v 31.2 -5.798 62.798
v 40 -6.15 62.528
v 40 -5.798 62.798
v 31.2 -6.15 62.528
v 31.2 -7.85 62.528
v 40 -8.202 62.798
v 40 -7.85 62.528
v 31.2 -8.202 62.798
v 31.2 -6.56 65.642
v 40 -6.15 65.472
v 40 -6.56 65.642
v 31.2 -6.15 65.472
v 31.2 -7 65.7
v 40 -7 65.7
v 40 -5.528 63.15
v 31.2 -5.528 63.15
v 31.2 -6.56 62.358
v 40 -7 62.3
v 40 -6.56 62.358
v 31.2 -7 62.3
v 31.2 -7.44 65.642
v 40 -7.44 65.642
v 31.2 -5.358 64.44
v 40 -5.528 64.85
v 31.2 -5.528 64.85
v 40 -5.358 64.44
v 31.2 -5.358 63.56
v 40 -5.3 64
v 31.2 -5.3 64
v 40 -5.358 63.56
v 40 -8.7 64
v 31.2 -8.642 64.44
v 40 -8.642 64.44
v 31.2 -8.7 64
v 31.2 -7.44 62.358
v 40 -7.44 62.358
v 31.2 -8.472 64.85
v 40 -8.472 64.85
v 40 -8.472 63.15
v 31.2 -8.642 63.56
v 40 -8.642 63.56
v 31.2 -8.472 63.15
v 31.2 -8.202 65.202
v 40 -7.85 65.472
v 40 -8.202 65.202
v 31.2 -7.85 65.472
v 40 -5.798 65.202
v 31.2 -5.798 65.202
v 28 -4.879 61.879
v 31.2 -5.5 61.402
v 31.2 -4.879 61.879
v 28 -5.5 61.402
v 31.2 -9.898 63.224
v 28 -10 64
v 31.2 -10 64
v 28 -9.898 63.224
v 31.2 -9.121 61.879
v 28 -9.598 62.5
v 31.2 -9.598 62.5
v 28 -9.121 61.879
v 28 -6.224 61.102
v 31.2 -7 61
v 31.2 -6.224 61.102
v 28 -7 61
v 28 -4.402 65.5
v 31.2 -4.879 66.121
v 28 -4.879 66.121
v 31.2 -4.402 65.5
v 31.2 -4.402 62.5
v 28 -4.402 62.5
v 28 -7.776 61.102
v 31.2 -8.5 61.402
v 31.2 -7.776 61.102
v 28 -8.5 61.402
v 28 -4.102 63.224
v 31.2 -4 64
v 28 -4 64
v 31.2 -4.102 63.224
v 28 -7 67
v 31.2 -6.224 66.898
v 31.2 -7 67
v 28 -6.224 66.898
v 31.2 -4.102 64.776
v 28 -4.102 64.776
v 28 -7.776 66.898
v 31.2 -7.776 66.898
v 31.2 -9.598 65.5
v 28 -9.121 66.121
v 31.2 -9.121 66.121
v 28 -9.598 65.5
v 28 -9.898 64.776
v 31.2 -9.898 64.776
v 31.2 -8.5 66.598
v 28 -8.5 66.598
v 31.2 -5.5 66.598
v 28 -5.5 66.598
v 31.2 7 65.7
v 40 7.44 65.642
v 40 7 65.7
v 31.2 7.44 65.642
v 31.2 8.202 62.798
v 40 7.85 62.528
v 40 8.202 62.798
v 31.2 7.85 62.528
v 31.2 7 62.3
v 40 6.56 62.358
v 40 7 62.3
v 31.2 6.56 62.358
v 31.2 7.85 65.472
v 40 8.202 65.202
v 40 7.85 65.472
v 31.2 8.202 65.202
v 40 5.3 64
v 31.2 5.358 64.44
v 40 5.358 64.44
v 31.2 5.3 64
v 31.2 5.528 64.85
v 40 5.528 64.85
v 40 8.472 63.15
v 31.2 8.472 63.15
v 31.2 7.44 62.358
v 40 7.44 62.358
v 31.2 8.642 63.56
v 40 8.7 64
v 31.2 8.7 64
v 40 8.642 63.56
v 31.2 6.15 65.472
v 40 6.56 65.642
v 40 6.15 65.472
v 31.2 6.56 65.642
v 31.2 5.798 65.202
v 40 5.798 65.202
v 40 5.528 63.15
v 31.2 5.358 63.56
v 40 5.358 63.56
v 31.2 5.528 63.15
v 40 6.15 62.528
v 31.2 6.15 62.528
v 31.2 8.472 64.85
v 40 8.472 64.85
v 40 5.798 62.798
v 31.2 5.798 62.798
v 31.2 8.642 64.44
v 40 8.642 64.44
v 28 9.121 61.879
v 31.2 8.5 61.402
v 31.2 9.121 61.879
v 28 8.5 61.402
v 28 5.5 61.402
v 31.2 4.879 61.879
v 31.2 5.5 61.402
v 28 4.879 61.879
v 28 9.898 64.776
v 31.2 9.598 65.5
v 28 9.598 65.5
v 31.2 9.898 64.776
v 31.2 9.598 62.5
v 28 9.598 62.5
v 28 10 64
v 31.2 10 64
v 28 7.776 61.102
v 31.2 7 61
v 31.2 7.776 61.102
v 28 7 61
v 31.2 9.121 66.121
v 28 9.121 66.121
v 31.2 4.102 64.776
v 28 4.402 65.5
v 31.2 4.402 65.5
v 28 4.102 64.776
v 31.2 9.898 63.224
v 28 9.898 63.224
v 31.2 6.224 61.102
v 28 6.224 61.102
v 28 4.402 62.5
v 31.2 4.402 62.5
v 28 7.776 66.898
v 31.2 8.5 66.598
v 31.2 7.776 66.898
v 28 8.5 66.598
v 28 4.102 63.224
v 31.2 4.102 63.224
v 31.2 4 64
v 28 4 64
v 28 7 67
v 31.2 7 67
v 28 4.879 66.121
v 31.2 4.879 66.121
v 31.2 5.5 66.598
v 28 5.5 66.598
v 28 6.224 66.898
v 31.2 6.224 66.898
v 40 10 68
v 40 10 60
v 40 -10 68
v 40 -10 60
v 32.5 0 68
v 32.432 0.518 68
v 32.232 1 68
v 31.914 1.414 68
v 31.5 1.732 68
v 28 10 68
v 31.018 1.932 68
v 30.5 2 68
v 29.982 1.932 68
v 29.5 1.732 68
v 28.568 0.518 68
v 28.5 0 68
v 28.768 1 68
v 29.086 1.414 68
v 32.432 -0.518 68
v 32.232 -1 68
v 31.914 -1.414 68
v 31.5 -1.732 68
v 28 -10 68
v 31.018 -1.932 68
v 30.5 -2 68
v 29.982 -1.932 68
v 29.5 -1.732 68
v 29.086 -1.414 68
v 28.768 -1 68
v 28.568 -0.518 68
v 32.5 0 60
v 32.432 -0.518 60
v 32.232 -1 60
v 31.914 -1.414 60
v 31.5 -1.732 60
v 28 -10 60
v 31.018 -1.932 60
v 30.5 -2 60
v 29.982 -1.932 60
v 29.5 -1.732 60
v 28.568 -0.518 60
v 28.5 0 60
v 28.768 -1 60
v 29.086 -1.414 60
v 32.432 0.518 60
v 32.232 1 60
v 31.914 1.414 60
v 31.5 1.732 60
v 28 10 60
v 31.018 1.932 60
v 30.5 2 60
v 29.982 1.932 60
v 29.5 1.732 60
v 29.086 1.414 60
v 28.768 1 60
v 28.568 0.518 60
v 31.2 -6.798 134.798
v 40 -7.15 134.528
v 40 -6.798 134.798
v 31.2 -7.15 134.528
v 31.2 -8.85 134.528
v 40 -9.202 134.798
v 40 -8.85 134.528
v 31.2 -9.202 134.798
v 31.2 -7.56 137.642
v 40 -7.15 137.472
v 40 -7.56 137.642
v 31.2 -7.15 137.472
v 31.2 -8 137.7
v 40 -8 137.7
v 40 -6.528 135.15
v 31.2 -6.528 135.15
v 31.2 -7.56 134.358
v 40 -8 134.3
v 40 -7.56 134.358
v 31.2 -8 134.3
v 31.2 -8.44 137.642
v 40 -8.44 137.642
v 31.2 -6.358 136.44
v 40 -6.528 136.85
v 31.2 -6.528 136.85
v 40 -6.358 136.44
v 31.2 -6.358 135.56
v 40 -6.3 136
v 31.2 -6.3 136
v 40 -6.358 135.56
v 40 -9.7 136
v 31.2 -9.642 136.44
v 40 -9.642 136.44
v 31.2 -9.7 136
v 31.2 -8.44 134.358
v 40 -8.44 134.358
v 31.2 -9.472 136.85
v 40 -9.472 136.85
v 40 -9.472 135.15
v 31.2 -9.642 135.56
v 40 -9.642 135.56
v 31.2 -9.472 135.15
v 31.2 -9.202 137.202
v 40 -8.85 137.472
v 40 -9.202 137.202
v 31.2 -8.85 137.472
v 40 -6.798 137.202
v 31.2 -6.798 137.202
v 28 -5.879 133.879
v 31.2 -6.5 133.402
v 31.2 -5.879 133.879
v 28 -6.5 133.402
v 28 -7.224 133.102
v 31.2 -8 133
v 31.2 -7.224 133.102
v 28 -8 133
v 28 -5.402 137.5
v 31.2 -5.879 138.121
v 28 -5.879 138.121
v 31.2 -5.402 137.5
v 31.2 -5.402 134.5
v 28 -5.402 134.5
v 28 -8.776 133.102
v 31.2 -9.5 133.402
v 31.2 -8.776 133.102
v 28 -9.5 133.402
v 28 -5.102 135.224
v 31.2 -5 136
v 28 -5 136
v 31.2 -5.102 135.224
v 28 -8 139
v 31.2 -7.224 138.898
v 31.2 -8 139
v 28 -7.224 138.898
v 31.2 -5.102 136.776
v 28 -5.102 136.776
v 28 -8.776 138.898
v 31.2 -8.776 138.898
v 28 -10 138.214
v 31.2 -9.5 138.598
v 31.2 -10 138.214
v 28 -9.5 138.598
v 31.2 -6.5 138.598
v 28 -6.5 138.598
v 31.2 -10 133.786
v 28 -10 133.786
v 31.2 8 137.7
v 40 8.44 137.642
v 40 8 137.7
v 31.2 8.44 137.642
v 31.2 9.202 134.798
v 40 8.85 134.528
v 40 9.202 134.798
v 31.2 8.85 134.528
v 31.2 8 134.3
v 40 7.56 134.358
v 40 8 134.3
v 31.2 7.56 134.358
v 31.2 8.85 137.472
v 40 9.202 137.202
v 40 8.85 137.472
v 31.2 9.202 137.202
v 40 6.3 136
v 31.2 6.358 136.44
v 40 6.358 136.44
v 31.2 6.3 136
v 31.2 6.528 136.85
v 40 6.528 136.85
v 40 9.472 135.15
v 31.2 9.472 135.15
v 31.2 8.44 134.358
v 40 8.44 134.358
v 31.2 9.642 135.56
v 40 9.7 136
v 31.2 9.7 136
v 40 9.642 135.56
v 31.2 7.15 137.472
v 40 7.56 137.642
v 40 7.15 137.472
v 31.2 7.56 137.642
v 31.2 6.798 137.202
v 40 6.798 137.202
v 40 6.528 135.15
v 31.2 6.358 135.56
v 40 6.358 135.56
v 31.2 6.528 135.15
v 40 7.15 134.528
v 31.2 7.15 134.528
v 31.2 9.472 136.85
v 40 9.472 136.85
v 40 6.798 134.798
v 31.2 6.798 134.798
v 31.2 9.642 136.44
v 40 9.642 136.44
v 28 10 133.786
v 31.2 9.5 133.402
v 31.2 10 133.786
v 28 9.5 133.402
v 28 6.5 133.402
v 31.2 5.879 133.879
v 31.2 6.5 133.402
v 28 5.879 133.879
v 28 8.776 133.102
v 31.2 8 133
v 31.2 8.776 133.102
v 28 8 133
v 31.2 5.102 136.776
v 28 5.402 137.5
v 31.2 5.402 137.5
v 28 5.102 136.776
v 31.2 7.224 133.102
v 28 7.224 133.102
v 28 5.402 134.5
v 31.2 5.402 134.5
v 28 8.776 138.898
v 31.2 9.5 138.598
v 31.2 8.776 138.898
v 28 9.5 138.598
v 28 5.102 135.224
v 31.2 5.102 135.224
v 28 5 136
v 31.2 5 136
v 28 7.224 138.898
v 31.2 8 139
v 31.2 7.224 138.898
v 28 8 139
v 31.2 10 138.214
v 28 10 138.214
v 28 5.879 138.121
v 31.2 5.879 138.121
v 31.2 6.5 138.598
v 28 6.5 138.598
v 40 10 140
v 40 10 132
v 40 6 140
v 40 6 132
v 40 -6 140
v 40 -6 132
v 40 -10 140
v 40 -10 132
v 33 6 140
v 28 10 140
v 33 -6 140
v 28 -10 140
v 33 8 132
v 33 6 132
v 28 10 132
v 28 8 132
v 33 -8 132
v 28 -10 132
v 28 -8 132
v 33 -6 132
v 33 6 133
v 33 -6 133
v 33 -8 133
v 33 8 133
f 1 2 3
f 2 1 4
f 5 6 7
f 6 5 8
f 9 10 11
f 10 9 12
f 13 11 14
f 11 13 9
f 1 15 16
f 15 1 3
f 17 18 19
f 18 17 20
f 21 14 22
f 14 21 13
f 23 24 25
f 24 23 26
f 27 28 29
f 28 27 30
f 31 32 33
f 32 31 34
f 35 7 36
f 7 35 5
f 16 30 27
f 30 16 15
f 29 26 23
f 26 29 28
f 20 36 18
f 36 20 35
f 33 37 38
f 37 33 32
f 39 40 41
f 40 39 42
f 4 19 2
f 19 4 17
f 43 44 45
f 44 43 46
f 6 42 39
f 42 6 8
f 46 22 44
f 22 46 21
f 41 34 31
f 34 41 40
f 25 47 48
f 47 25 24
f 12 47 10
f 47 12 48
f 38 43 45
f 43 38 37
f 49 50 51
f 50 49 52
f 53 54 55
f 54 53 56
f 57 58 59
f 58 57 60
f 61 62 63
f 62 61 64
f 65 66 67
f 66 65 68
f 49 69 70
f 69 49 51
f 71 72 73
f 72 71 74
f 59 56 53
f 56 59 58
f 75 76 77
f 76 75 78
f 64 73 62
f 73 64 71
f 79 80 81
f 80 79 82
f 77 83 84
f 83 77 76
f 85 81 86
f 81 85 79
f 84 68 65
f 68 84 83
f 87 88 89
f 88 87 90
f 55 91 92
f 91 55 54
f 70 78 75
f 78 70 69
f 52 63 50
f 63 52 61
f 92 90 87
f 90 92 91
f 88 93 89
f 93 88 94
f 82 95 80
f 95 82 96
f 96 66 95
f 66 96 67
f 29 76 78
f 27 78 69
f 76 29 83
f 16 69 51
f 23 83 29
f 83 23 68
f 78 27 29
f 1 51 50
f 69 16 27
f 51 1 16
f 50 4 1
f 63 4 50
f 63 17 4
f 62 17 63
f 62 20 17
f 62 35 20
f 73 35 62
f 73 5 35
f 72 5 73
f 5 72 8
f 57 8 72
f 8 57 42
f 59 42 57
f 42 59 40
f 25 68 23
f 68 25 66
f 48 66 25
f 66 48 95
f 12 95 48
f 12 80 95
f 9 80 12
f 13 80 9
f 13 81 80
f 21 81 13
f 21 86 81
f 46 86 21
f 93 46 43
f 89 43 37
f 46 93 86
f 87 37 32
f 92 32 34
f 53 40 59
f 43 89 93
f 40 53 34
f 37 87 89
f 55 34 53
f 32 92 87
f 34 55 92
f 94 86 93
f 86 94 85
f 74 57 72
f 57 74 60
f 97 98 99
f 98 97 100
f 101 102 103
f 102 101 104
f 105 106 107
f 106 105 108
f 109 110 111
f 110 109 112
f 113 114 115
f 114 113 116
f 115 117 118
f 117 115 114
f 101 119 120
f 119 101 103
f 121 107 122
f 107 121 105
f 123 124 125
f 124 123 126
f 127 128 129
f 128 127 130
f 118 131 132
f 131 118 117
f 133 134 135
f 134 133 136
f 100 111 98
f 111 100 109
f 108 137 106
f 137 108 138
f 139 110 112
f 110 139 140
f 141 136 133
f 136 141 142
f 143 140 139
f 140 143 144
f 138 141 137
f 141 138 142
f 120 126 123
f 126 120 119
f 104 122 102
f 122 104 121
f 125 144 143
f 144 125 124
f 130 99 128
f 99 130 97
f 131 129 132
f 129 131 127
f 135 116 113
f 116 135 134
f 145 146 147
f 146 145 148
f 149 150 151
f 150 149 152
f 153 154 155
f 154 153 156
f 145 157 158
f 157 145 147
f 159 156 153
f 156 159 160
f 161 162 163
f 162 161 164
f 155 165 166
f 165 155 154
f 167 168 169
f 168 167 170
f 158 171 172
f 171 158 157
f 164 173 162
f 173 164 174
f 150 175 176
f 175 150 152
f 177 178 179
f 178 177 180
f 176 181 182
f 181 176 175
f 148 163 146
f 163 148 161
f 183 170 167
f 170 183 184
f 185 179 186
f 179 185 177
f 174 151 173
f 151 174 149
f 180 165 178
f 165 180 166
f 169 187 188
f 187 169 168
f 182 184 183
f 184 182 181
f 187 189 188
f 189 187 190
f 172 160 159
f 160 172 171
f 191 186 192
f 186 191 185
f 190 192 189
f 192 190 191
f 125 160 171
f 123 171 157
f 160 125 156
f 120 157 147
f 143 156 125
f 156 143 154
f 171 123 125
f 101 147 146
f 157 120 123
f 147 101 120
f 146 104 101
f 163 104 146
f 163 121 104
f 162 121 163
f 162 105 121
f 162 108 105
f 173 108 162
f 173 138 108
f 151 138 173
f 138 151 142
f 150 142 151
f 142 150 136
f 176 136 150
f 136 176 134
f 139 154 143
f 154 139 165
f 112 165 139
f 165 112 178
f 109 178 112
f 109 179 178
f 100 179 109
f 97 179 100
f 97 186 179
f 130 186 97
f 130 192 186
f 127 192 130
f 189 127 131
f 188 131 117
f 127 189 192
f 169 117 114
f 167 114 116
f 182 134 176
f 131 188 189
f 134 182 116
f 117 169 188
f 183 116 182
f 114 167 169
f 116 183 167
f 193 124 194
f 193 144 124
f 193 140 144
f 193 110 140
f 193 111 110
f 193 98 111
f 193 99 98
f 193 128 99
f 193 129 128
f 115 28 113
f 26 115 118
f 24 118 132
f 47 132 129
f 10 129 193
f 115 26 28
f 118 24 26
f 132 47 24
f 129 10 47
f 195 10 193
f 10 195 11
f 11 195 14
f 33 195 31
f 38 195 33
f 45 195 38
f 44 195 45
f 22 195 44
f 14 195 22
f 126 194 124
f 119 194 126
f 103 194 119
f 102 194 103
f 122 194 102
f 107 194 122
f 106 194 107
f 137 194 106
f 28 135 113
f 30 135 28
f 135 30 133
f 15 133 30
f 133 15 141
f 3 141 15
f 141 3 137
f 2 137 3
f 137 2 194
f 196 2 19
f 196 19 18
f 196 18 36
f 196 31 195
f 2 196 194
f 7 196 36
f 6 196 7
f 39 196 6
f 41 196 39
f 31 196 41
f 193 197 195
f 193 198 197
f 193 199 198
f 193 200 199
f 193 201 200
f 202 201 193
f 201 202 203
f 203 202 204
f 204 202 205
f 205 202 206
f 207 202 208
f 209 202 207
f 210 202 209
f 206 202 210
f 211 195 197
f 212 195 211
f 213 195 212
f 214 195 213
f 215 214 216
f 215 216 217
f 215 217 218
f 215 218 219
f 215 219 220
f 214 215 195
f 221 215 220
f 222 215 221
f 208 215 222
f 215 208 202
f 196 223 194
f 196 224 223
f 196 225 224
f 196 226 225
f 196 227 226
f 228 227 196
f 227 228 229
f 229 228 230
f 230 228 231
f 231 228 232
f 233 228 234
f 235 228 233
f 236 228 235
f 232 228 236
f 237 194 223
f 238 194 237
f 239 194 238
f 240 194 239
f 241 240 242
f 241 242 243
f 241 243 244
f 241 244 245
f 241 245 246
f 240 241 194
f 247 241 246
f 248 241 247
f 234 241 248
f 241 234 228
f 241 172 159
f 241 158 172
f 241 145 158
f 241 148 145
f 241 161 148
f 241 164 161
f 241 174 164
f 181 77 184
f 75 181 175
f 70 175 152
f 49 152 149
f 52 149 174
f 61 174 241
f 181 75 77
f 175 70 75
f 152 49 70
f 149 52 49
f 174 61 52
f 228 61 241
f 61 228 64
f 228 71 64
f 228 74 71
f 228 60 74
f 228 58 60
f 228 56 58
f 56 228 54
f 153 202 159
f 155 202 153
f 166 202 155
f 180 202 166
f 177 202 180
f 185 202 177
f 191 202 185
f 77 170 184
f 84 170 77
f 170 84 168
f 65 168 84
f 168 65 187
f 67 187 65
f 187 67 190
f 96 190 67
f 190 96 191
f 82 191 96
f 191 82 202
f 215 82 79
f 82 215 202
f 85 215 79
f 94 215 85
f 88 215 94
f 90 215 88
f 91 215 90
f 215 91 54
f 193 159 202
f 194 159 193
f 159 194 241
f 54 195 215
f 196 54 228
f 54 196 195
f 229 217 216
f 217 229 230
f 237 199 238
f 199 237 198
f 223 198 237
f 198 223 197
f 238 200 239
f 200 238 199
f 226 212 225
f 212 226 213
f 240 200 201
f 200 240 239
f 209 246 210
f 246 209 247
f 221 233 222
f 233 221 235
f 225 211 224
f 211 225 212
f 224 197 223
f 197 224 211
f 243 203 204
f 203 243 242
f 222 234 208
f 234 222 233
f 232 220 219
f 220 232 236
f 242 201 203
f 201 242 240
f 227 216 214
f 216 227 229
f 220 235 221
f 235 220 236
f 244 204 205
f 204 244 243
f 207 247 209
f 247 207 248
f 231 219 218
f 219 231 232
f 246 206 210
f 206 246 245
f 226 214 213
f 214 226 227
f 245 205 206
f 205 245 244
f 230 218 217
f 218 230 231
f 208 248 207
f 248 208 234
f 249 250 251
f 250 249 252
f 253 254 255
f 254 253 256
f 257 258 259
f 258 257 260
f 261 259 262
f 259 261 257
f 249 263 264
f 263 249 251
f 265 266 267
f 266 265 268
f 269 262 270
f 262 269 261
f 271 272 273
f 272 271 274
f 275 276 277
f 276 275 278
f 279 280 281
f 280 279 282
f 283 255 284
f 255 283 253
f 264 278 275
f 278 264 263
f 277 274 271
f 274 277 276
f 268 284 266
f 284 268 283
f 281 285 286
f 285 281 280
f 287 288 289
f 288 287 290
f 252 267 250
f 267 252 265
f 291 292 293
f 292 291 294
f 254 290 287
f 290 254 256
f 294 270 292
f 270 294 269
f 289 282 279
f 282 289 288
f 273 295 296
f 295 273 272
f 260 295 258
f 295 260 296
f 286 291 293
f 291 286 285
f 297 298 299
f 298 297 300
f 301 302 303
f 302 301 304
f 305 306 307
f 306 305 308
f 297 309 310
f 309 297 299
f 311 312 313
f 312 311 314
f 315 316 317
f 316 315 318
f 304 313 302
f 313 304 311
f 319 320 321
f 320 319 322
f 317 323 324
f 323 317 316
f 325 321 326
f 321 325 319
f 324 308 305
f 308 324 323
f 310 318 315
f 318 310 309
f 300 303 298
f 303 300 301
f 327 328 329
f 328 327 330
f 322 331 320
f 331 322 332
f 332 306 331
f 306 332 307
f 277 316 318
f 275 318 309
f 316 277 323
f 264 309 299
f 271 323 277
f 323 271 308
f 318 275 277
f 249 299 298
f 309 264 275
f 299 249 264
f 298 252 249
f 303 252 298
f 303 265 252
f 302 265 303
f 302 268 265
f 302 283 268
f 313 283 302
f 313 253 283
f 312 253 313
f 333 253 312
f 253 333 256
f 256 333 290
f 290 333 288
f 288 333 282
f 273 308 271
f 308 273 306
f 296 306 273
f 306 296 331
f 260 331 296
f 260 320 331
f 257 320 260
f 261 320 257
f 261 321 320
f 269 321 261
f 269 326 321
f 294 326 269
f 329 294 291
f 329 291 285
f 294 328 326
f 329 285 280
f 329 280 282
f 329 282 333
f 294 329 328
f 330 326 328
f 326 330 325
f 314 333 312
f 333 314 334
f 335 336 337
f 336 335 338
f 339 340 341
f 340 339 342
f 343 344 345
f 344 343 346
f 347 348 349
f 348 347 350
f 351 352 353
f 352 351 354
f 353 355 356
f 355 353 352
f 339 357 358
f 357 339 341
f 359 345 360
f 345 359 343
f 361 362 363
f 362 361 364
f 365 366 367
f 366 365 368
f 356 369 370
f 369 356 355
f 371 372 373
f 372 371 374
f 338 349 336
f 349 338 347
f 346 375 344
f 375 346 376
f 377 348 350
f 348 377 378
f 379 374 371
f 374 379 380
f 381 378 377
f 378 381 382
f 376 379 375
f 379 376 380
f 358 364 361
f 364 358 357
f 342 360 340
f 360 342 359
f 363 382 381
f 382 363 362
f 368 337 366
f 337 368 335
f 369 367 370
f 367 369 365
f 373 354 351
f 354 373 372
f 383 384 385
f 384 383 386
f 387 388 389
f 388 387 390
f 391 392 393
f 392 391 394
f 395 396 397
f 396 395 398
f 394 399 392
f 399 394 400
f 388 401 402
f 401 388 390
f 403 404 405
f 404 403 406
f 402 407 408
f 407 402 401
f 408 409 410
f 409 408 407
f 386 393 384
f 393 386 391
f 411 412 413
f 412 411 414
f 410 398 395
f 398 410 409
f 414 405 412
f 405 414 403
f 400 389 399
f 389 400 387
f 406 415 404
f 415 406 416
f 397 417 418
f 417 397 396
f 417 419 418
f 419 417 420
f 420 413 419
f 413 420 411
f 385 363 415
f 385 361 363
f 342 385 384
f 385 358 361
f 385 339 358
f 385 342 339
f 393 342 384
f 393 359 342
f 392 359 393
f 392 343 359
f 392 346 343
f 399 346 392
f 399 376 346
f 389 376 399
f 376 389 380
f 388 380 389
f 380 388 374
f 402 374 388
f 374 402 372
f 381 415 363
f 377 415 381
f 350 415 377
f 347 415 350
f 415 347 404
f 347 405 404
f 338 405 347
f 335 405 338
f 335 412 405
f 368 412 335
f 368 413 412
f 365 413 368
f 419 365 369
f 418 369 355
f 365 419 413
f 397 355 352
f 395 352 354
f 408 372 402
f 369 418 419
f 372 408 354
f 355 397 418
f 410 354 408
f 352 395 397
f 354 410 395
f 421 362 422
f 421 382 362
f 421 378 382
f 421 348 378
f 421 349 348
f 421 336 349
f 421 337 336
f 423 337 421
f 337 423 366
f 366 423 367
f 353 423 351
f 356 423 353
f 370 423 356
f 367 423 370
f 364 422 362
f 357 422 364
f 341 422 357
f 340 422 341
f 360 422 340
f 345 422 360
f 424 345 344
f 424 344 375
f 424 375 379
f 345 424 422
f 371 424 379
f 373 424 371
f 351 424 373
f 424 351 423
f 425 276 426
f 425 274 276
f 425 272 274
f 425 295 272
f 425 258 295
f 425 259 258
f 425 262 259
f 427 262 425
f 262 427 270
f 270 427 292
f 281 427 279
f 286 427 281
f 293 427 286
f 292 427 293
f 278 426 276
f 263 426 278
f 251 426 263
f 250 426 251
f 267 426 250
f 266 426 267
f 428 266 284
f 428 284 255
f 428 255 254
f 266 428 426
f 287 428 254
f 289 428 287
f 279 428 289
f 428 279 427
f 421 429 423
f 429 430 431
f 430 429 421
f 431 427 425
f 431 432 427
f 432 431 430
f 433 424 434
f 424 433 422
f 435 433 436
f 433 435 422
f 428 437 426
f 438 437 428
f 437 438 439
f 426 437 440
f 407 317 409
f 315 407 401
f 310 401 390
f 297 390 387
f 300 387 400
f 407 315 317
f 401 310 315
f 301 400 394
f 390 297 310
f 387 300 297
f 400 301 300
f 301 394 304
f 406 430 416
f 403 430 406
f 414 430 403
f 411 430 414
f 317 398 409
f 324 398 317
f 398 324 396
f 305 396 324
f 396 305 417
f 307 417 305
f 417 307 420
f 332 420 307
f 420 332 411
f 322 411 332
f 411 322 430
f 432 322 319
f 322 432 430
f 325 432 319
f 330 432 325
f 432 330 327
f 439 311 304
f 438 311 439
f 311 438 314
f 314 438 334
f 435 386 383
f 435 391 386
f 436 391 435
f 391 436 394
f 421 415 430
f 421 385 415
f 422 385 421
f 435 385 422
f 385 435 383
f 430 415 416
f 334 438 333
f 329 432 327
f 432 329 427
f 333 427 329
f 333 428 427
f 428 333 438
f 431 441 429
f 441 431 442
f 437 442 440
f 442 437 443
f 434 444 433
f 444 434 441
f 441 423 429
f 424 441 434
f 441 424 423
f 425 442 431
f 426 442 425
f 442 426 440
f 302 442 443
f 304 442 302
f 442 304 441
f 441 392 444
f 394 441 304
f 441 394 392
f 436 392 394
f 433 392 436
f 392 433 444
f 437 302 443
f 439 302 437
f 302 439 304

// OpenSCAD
// =====================================================================
//  p23_p24_rail_stops.scad - P23 rail down-stop block (thumbscrew) and P24 rail up-stop block (TPU pad)
//  PROJECT SCRATCH · 05-engineering/cad/frame · units: mm · frame: global (section 2)
//  Sources: mechanical.md section 6.3 (down-stop Z 60..68 below the rail end, M3 brass insert vertical, M3 x 16
//  knurled thumbscrew + jam nut, tip at X 29 / Z 69 under the riser's foot tab; up-stop 2 mm TPU pad 28 above the
//  default down-stop: carriage top 103 -> pad face at Z 131), 11 P23/P24.  PART = "down" | "up" | "both".
//  Both blocks are 12 (X 28..40) x 20 x 8 and screw to the mast's -X face (X 40) with 2 x M3 x 8 (counterbored).
//  The up-stop straddles the rail (channel Y +/-6, clear of the 1 mm reference lip).
// =====================================================================
include <lib_sp1.scad>
PART = "both";

// P23
D_X0 = 28;  D_X1 = 40;  D_Y = 10;  D_Z0 = 60;  D_Z1 = 68;  D_SCREW_X = 30.5;  D_MOUNT = [[-7, 64], [7, 64]];
// P24
U_X0 = 28;  U_X1 = 40;  U_Y = 10;  U_Z0 = 132;  U_Z1 = 140;  PAD_T = 2;  PAD_RECESS = 1;  PAD_X = [28, 33];
RAIL_CH_Y = 6;  RAIL_CH_X0 = 33;  U_MOUNT = [[-8, 136], [8, 136]];

module p23_rail_down_stop() difference() {
    box(D_X0, D_X1, -D_Y, D_Y, D_Z0, D_Z1);
    cyl_z(M3_INS_D / 2, D_Z0 - 1, D_Z1 + 1, D_SCREW_X, 0, fn = 24);                 // brass insert, thumbscrew from above
    for (h = D_MOUNT) { cyl_x(M3_CLEAR / 2, D_X0 - 1, D_X1 + 1, h[0], h[1], fn = 24); cyl_x(M3_HEAD_D / 2, D_X0 - 1, D_X0 + M3_HEAD_H, h[0], h[1], fn = 24); }
}
module p24_rail_up_stop() difference() {
    box(U_X0, U_X1, -U_Y, U_Y, U_Z0, U_Z1);
    box(RAIL_CH_X0, U_X1 + 1, -RAIL_CH_Y, RAIL_CH_Y, U_Z0 - 1, U_Z1 + 1);            // rail channel
    box(PAD_X[0] - 1, PAD_X[1], -U_Y + 2, U_Y - 2, U_Z0 - 1, U_Z0 + PAD_RECESS);     // TPU pad recess (pad 2 thick, 1 proud)
    for (h = U_MOUNT) { cyl_x(M3_CLEAR / 2, U_X0 - 1, U_X1 + 1, h[0], h[1], fn = 24); cyl_x(M3_HEAD_D / 2, U_X0 - 1, U_X0 + M3_HEAD_H, h[0], h[1], fn = 24); }
}
if (PART == "down" || PART == "both") p23_rail_down_stop();
if (PART == "up" || PART == "both") p24_rail_up_stop();
